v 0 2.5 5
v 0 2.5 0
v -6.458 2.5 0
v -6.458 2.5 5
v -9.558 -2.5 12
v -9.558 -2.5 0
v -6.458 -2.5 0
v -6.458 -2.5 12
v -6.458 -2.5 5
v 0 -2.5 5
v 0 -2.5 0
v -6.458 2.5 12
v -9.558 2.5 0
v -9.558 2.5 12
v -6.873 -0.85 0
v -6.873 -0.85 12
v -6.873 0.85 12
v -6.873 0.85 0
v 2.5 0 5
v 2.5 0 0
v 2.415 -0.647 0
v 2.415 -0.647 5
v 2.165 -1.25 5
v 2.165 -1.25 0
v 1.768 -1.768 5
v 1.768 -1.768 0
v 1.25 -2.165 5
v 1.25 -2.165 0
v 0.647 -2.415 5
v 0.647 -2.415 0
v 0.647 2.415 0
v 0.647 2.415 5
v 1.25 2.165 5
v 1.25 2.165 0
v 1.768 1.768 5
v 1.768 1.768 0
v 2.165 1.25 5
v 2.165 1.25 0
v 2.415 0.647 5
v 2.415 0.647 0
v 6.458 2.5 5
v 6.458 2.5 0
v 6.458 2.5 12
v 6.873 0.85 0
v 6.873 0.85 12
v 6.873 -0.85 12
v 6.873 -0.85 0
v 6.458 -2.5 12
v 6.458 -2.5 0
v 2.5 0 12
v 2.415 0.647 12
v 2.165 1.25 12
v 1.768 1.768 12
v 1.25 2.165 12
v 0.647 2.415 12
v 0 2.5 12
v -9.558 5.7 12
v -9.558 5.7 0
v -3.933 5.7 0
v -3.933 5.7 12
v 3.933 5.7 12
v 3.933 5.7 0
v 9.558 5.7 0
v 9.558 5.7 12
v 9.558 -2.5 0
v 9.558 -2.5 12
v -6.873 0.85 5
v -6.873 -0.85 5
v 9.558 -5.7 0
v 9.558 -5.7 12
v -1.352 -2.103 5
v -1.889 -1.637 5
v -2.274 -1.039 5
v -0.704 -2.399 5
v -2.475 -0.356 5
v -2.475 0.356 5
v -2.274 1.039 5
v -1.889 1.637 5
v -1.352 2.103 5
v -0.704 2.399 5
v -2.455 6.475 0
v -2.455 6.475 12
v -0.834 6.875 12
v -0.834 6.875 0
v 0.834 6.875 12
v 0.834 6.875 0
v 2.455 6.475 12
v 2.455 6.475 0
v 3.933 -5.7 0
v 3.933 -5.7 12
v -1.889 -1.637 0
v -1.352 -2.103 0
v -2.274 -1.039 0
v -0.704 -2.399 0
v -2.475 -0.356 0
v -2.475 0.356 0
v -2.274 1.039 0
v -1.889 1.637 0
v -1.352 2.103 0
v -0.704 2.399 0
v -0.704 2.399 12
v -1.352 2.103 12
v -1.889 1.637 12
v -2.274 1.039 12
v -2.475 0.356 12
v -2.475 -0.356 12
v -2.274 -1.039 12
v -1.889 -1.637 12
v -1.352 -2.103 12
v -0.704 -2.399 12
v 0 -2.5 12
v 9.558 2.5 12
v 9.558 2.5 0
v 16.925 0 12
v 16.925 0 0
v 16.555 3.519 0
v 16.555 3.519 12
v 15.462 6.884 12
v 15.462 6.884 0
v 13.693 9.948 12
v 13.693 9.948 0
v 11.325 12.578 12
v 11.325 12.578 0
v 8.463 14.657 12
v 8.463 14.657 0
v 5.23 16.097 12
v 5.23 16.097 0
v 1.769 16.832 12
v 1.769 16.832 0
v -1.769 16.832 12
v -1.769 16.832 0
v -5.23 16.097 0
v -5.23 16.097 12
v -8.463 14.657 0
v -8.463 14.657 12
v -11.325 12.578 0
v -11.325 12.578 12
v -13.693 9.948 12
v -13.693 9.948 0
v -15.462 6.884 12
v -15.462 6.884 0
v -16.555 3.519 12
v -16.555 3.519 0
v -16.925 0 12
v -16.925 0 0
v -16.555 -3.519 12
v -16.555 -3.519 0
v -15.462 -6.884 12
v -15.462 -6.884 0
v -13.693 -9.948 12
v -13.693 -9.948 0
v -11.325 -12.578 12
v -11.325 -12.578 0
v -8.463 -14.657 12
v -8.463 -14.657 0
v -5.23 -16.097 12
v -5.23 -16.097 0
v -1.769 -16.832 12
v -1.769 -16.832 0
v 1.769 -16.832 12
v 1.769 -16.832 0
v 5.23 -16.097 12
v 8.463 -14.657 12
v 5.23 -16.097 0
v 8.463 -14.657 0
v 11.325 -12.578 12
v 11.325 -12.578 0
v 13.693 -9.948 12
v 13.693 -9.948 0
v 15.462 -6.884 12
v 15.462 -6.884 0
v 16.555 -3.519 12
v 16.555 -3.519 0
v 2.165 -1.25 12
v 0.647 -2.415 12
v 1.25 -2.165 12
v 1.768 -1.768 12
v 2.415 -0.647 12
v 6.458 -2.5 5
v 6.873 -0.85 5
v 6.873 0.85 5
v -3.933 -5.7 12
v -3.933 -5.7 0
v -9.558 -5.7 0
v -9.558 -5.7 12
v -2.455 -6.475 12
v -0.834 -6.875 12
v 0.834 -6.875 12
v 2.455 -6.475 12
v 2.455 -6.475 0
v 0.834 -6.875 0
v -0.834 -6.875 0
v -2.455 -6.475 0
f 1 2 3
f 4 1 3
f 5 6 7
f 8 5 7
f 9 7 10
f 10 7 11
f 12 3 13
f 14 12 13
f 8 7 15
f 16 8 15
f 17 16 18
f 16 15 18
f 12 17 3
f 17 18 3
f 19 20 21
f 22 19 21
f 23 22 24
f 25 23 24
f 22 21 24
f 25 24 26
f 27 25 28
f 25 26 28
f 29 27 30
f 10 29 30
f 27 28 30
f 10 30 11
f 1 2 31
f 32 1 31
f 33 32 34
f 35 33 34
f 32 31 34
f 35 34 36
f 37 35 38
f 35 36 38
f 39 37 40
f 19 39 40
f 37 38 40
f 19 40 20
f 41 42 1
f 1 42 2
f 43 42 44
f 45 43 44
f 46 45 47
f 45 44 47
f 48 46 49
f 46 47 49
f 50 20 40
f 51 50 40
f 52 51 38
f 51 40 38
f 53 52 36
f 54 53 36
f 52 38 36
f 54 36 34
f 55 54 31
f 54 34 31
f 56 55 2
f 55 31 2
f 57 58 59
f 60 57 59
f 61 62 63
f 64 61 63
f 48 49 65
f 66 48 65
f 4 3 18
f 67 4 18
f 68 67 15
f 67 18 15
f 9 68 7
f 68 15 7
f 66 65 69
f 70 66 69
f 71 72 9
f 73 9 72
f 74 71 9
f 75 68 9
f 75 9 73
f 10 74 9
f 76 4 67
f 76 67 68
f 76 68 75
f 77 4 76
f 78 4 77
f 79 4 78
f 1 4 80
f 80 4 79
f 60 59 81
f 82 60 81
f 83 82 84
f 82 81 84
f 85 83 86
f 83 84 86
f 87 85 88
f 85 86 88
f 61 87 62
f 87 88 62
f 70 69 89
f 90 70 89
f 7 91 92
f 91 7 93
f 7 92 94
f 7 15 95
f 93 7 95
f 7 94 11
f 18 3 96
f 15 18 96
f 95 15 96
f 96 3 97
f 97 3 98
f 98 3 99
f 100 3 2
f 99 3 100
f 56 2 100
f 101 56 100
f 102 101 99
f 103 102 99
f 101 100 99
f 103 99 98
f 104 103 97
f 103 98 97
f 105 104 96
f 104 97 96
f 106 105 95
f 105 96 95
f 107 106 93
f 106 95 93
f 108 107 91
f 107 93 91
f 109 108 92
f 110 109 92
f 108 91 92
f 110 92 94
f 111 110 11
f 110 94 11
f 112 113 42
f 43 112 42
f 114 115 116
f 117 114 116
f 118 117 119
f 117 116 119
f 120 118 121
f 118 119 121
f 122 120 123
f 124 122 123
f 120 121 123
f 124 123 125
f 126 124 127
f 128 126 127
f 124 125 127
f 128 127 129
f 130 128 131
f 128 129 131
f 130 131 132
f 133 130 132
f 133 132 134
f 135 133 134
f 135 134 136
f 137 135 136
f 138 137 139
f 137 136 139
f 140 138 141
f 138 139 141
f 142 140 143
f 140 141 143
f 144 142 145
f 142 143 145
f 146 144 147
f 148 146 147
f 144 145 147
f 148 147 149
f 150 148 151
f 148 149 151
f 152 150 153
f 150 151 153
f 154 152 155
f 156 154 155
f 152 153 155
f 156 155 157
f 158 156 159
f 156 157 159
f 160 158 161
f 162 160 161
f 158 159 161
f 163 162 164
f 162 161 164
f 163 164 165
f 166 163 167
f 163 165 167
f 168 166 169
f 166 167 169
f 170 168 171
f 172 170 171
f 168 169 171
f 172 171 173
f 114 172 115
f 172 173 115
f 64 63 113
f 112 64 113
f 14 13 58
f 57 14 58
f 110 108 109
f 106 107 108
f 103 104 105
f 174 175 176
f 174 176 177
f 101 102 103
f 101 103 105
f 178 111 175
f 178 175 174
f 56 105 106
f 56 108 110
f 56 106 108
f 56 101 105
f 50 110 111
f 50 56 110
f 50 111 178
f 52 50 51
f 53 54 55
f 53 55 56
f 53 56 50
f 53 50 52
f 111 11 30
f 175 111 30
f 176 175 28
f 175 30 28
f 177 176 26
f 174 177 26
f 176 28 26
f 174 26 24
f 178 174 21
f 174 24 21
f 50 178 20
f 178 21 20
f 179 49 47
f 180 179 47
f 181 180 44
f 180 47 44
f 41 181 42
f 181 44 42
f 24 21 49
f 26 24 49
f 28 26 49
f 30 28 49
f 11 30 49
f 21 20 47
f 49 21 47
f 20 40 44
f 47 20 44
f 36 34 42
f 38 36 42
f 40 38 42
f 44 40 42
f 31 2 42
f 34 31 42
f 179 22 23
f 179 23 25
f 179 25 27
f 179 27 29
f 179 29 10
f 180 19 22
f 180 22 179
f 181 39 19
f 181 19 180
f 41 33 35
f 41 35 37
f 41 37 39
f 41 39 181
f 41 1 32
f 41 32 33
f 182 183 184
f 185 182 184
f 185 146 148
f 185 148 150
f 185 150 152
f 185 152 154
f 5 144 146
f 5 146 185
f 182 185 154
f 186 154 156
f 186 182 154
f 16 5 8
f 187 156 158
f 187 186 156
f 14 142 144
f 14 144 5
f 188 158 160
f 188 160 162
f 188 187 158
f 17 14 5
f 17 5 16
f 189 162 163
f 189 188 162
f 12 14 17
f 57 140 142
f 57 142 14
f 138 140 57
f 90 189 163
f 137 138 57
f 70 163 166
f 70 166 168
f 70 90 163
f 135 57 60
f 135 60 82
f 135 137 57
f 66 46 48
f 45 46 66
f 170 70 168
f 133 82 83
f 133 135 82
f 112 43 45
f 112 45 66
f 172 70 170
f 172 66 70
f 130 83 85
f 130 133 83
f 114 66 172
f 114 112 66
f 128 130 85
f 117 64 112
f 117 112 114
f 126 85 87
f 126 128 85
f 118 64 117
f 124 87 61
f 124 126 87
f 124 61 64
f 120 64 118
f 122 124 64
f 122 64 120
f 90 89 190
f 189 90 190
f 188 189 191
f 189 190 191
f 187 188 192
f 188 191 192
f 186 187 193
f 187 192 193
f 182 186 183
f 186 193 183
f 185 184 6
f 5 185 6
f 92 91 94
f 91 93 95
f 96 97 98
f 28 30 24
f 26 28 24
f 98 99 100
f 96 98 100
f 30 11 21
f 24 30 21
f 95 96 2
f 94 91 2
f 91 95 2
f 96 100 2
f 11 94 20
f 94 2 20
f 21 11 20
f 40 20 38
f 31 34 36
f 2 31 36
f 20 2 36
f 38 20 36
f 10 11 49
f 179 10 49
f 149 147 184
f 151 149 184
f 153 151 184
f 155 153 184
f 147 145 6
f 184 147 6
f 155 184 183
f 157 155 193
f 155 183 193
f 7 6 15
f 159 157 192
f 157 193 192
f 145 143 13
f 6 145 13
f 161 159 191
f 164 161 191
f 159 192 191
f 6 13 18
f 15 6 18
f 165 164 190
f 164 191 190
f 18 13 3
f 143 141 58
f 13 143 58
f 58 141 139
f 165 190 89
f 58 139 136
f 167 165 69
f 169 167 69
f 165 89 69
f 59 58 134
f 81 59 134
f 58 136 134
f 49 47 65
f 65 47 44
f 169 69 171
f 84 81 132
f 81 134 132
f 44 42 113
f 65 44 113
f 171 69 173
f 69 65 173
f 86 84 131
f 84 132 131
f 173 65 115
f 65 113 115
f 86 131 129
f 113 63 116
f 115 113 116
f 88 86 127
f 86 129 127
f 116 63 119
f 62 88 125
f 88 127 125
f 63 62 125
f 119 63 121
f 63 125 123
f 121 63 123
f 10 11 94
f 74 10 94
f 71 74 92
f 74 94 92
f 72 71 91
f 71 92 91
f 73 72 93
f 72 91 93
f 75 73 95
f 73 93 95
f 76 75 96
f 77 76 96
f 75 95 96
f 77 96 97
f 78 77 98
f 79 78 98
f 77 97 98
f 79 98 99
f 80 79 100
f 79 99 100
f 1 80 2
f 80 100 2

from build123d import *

# Parameters (mm, degrees)
F0_R     = 16.925
F1_DEPTH = 12
F2_DEPTH = 5
F3_DEPTH = 12


with BuildPart() as f1:
    # F0 (on Top) → F1 (new body)
    with BuildSketch(Plane.XY):
        Circle(F0_R)
        with BuildLine():
            ThreePointArc((-3.932636, 5.7), (0, 6.925), (3.932636, 5.7))
            Line((3.932636, 5.7), (9.557989, 5.7))
            Line((9.557989, 5.7), (9.557989, 2.5))
            Line((9.557989, 2.5), (6.457989, 2.5))
            ThreePointArc((6.457989, 2.5), (6.925, 0), (6.457989, -2.5))
            Line((6.457989, -2.5), (9.557989, -2.5))
            Line((9.557989, -2.5), (9.557989, -5.7))
            Line((9.557989, -5.7), (3.932636, -5.7))
            ThreePointArc((3.932636, -5.7), (0, -6.925), (-3.932636, -5.7))
            Line((-3.932636, -5.7), (-9.557989, -5.7))
            Line((-9.557989, -5.7), (-9.557989, -2.5))
            Line((-9.557989, -2.5), (-6.457989, -2.5))
            ThreePointArc((-6.457989, -2.5), (-6.925, 0), (-6.457989, 2.5))
            Line((-6.457989, 2.5), (-9.557989, 2.5))
            Line((-9.557989, 2.5), (-9.557989, 5.7))
            Line((-9.557989, 5.7), (-3.932636, 5.7))
        make_face(mode=Mode.SUBTRACT)
    extrude(amount=F1_DEPTH)


with BuildPart() as f2:
    # F0 (on Top) → F2 (new body)
    with BuildSketch(Plane.XY):
        with BuildLine():
            ThreePointArc((6.457989, -2.5), (6.925, 0), (6.457989, 2.5))
            Line((6.457989, 2.5), (0, 2.5))
            ThreePointArc((0, 2.5), (1.767767, 1.767767), (2.5, 0))
            ThreePointArc((2.5, 0), (1.767767, -1.767767), (0, -2.5))
            Line((0, -2.5), (6.457989, -2.5))
        make_face()
        with BuildLine():
            Line((0, 2.5), (-6.457989, 2.5))
            ThreePointArc((-6.457989, 2.5), (-6.925, 0), (-6.457989, -2.5))
            Line((-6.457989, -2.5), (0, -2.5))
            ThreePointArc((0, -2.5), (-2.5, 0), (0, 2.5))
        make_face()
    extrude(amount=F2_DEPTH)


with BuildPart() as f3:
    # F0 (on Top) → F3 (new body)
    with BuildSketch(Plane.XY):
        with BuildLine():
            ThreePointArc((2.5, 0), (1.767767, 1.767767), (0, 2.5))
            ThreePointArc((0, 2.5), (-2.5, 0), (0, -2.5))
            ThreePointArc((0, -2.5), (1.767767, -1.767767), (2.5, 0))
        make_face()
    extrude(amount=F3_DEPTH)


solid = Compound([f1.part, f2.part, f3.part])
